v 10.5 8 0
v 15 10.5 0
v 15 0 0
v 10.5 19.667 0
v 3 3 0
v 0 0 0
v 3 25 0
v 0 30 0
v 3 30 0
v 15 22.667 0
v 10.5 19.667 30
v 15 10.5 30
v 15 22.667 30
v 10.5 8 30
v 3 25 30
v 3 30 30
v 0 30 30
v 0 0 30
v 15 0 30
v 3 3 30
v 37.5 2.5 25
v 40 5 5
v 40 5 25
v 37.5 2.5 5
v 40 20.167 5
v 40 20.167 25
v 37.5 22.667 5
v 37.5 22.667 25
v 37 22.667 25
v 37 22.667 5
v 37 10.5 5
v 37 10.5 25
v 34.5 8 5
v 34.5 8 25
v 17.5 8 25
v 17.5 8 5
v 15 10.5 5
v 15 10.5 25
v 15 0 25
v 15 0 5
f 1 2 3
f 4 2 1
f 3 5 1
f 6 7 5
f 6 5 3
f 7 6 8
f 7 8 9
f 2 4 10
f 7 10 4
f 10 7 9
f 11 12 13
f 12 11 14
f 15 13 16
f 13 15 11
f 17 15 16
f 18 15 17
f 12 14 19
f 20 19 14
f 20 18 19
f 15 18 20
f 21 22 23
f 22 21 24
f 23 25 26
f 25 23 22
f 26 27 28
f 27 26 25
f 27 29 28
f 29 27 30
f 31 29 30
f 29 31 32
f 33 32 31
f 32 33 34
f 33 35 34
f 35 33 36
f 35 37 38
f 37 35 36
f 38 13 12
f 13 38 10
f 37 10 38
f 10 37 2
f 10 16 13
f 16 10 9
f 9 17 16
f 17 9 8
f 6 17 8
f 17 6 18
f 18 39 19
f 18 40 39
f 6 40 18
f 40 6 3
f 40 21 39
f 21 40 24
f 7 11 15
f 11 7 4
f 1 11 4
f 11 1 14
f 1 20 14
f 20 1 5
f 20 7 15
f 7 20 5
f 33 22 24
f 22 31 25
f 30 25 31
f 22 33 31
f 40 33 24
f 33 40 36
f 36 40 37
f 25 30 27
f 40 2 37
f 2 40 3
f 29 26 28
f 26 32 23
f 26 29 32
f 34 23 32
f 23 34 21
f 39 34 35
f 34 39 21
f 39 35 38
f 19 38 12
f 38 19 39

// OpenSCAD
// created by IndiePandaaaaa | Lukas

width = 30;
height = width;
pole_diameter = 20; // diameter of the pole
wall_offset = 15;
hook_width = 20;

module towel_hook(width, height, pole_diameter, wall_offset, hook_width, material_strength = 3, socket = 5, chamfer =
2.5) {
    pole_dia = pole_diameter + 2; // diameter of the pole with additional offset
    mat_strength = material_strength;

    module hook_width_removal(width) {
        linear_extrude(height = width) {
            polygon([
                    [wall_offset, 0],
                    [wall_offset + pole_dia + mat_strength - chamfer, socket - chamfer],
                    [wall_offset + pole_dia + mat_strength, socket],
                    [wall_offset + pole_dia + mat_strength, socket + mat_strength + pole_dia / 3 * 2 - chamfer],
                    [wall_offset + pole_dia + mat_strength - chamfer, socket + mat_strength + pole_dia / 3 * 2],
                    [wall_offset + pole_dia, socket + mat_strength + pole_dia / 3 * 2],
                    [wall_offset + pole_dia, socket + mat_strength + chamfer],
                    [wall_offset + pole_dia - chamfer, socket + mat_strength],
                    [wall_offset + chamfer, socket + mat_strength],
                    [wall_offset, socket + mat_strength + chamfer],
                ]);
        }
    }

    difference() {
        linear_extrude(height = width) {
            difference() {
                polygon([
                        [0, 0],
                        [wall_offset, 0],
                        [wall_offset + pole_dia + mat_strength - chamfer, socket - chamfer],
                        [wall_offset + pole_dia + mat_strength, socket],
                        [wall_offset + pole_dia + mat_strength, socket + mat_strength + pole_dia / 3 * 2 - chamfer],
                        [wall_offset + pole_dia + mat_strength - chamfer, socket + mat_strength + pole_dia / 3 * 2],
                        [wall_offset + pole_dia, socket + mat_strength + pole_dia / 3 * 2],
                        [wall_offset + pole_dia, socket + mat_strength + chamfer],
                        [wall_offset + pole_dia - chamfer, socket + mat_strength],
                        [wall_offset + chamfer, socket + mat_strength],
                        [wall_offset, socket + mat_strength + chamfer],
                        [wall_offset, socket + mat_strength + pole_dia / 3 * 2],
                        [mat_strength, height],
                        [0, height],
                    ]);
                polygon([
                        [mat_strength, mat_strength],
                        [wall_offset - mat_strength * 1.5, mat_strength + socket],
                        [wall_offset - mat_strength * 1.5, socket + pole_dia / 3 * 2],
                        [mat_strength, height - socket],
                    ]);
            }
        }

        removal = (width - hook_width) / 2;
        hook_width_removal(removal);
        translate([0, 0, hook_width + removal])
            hook_width_removal(removal);
    }
}

towel_hook(width, height, pole_diameter, wall_offset, hook_width);
